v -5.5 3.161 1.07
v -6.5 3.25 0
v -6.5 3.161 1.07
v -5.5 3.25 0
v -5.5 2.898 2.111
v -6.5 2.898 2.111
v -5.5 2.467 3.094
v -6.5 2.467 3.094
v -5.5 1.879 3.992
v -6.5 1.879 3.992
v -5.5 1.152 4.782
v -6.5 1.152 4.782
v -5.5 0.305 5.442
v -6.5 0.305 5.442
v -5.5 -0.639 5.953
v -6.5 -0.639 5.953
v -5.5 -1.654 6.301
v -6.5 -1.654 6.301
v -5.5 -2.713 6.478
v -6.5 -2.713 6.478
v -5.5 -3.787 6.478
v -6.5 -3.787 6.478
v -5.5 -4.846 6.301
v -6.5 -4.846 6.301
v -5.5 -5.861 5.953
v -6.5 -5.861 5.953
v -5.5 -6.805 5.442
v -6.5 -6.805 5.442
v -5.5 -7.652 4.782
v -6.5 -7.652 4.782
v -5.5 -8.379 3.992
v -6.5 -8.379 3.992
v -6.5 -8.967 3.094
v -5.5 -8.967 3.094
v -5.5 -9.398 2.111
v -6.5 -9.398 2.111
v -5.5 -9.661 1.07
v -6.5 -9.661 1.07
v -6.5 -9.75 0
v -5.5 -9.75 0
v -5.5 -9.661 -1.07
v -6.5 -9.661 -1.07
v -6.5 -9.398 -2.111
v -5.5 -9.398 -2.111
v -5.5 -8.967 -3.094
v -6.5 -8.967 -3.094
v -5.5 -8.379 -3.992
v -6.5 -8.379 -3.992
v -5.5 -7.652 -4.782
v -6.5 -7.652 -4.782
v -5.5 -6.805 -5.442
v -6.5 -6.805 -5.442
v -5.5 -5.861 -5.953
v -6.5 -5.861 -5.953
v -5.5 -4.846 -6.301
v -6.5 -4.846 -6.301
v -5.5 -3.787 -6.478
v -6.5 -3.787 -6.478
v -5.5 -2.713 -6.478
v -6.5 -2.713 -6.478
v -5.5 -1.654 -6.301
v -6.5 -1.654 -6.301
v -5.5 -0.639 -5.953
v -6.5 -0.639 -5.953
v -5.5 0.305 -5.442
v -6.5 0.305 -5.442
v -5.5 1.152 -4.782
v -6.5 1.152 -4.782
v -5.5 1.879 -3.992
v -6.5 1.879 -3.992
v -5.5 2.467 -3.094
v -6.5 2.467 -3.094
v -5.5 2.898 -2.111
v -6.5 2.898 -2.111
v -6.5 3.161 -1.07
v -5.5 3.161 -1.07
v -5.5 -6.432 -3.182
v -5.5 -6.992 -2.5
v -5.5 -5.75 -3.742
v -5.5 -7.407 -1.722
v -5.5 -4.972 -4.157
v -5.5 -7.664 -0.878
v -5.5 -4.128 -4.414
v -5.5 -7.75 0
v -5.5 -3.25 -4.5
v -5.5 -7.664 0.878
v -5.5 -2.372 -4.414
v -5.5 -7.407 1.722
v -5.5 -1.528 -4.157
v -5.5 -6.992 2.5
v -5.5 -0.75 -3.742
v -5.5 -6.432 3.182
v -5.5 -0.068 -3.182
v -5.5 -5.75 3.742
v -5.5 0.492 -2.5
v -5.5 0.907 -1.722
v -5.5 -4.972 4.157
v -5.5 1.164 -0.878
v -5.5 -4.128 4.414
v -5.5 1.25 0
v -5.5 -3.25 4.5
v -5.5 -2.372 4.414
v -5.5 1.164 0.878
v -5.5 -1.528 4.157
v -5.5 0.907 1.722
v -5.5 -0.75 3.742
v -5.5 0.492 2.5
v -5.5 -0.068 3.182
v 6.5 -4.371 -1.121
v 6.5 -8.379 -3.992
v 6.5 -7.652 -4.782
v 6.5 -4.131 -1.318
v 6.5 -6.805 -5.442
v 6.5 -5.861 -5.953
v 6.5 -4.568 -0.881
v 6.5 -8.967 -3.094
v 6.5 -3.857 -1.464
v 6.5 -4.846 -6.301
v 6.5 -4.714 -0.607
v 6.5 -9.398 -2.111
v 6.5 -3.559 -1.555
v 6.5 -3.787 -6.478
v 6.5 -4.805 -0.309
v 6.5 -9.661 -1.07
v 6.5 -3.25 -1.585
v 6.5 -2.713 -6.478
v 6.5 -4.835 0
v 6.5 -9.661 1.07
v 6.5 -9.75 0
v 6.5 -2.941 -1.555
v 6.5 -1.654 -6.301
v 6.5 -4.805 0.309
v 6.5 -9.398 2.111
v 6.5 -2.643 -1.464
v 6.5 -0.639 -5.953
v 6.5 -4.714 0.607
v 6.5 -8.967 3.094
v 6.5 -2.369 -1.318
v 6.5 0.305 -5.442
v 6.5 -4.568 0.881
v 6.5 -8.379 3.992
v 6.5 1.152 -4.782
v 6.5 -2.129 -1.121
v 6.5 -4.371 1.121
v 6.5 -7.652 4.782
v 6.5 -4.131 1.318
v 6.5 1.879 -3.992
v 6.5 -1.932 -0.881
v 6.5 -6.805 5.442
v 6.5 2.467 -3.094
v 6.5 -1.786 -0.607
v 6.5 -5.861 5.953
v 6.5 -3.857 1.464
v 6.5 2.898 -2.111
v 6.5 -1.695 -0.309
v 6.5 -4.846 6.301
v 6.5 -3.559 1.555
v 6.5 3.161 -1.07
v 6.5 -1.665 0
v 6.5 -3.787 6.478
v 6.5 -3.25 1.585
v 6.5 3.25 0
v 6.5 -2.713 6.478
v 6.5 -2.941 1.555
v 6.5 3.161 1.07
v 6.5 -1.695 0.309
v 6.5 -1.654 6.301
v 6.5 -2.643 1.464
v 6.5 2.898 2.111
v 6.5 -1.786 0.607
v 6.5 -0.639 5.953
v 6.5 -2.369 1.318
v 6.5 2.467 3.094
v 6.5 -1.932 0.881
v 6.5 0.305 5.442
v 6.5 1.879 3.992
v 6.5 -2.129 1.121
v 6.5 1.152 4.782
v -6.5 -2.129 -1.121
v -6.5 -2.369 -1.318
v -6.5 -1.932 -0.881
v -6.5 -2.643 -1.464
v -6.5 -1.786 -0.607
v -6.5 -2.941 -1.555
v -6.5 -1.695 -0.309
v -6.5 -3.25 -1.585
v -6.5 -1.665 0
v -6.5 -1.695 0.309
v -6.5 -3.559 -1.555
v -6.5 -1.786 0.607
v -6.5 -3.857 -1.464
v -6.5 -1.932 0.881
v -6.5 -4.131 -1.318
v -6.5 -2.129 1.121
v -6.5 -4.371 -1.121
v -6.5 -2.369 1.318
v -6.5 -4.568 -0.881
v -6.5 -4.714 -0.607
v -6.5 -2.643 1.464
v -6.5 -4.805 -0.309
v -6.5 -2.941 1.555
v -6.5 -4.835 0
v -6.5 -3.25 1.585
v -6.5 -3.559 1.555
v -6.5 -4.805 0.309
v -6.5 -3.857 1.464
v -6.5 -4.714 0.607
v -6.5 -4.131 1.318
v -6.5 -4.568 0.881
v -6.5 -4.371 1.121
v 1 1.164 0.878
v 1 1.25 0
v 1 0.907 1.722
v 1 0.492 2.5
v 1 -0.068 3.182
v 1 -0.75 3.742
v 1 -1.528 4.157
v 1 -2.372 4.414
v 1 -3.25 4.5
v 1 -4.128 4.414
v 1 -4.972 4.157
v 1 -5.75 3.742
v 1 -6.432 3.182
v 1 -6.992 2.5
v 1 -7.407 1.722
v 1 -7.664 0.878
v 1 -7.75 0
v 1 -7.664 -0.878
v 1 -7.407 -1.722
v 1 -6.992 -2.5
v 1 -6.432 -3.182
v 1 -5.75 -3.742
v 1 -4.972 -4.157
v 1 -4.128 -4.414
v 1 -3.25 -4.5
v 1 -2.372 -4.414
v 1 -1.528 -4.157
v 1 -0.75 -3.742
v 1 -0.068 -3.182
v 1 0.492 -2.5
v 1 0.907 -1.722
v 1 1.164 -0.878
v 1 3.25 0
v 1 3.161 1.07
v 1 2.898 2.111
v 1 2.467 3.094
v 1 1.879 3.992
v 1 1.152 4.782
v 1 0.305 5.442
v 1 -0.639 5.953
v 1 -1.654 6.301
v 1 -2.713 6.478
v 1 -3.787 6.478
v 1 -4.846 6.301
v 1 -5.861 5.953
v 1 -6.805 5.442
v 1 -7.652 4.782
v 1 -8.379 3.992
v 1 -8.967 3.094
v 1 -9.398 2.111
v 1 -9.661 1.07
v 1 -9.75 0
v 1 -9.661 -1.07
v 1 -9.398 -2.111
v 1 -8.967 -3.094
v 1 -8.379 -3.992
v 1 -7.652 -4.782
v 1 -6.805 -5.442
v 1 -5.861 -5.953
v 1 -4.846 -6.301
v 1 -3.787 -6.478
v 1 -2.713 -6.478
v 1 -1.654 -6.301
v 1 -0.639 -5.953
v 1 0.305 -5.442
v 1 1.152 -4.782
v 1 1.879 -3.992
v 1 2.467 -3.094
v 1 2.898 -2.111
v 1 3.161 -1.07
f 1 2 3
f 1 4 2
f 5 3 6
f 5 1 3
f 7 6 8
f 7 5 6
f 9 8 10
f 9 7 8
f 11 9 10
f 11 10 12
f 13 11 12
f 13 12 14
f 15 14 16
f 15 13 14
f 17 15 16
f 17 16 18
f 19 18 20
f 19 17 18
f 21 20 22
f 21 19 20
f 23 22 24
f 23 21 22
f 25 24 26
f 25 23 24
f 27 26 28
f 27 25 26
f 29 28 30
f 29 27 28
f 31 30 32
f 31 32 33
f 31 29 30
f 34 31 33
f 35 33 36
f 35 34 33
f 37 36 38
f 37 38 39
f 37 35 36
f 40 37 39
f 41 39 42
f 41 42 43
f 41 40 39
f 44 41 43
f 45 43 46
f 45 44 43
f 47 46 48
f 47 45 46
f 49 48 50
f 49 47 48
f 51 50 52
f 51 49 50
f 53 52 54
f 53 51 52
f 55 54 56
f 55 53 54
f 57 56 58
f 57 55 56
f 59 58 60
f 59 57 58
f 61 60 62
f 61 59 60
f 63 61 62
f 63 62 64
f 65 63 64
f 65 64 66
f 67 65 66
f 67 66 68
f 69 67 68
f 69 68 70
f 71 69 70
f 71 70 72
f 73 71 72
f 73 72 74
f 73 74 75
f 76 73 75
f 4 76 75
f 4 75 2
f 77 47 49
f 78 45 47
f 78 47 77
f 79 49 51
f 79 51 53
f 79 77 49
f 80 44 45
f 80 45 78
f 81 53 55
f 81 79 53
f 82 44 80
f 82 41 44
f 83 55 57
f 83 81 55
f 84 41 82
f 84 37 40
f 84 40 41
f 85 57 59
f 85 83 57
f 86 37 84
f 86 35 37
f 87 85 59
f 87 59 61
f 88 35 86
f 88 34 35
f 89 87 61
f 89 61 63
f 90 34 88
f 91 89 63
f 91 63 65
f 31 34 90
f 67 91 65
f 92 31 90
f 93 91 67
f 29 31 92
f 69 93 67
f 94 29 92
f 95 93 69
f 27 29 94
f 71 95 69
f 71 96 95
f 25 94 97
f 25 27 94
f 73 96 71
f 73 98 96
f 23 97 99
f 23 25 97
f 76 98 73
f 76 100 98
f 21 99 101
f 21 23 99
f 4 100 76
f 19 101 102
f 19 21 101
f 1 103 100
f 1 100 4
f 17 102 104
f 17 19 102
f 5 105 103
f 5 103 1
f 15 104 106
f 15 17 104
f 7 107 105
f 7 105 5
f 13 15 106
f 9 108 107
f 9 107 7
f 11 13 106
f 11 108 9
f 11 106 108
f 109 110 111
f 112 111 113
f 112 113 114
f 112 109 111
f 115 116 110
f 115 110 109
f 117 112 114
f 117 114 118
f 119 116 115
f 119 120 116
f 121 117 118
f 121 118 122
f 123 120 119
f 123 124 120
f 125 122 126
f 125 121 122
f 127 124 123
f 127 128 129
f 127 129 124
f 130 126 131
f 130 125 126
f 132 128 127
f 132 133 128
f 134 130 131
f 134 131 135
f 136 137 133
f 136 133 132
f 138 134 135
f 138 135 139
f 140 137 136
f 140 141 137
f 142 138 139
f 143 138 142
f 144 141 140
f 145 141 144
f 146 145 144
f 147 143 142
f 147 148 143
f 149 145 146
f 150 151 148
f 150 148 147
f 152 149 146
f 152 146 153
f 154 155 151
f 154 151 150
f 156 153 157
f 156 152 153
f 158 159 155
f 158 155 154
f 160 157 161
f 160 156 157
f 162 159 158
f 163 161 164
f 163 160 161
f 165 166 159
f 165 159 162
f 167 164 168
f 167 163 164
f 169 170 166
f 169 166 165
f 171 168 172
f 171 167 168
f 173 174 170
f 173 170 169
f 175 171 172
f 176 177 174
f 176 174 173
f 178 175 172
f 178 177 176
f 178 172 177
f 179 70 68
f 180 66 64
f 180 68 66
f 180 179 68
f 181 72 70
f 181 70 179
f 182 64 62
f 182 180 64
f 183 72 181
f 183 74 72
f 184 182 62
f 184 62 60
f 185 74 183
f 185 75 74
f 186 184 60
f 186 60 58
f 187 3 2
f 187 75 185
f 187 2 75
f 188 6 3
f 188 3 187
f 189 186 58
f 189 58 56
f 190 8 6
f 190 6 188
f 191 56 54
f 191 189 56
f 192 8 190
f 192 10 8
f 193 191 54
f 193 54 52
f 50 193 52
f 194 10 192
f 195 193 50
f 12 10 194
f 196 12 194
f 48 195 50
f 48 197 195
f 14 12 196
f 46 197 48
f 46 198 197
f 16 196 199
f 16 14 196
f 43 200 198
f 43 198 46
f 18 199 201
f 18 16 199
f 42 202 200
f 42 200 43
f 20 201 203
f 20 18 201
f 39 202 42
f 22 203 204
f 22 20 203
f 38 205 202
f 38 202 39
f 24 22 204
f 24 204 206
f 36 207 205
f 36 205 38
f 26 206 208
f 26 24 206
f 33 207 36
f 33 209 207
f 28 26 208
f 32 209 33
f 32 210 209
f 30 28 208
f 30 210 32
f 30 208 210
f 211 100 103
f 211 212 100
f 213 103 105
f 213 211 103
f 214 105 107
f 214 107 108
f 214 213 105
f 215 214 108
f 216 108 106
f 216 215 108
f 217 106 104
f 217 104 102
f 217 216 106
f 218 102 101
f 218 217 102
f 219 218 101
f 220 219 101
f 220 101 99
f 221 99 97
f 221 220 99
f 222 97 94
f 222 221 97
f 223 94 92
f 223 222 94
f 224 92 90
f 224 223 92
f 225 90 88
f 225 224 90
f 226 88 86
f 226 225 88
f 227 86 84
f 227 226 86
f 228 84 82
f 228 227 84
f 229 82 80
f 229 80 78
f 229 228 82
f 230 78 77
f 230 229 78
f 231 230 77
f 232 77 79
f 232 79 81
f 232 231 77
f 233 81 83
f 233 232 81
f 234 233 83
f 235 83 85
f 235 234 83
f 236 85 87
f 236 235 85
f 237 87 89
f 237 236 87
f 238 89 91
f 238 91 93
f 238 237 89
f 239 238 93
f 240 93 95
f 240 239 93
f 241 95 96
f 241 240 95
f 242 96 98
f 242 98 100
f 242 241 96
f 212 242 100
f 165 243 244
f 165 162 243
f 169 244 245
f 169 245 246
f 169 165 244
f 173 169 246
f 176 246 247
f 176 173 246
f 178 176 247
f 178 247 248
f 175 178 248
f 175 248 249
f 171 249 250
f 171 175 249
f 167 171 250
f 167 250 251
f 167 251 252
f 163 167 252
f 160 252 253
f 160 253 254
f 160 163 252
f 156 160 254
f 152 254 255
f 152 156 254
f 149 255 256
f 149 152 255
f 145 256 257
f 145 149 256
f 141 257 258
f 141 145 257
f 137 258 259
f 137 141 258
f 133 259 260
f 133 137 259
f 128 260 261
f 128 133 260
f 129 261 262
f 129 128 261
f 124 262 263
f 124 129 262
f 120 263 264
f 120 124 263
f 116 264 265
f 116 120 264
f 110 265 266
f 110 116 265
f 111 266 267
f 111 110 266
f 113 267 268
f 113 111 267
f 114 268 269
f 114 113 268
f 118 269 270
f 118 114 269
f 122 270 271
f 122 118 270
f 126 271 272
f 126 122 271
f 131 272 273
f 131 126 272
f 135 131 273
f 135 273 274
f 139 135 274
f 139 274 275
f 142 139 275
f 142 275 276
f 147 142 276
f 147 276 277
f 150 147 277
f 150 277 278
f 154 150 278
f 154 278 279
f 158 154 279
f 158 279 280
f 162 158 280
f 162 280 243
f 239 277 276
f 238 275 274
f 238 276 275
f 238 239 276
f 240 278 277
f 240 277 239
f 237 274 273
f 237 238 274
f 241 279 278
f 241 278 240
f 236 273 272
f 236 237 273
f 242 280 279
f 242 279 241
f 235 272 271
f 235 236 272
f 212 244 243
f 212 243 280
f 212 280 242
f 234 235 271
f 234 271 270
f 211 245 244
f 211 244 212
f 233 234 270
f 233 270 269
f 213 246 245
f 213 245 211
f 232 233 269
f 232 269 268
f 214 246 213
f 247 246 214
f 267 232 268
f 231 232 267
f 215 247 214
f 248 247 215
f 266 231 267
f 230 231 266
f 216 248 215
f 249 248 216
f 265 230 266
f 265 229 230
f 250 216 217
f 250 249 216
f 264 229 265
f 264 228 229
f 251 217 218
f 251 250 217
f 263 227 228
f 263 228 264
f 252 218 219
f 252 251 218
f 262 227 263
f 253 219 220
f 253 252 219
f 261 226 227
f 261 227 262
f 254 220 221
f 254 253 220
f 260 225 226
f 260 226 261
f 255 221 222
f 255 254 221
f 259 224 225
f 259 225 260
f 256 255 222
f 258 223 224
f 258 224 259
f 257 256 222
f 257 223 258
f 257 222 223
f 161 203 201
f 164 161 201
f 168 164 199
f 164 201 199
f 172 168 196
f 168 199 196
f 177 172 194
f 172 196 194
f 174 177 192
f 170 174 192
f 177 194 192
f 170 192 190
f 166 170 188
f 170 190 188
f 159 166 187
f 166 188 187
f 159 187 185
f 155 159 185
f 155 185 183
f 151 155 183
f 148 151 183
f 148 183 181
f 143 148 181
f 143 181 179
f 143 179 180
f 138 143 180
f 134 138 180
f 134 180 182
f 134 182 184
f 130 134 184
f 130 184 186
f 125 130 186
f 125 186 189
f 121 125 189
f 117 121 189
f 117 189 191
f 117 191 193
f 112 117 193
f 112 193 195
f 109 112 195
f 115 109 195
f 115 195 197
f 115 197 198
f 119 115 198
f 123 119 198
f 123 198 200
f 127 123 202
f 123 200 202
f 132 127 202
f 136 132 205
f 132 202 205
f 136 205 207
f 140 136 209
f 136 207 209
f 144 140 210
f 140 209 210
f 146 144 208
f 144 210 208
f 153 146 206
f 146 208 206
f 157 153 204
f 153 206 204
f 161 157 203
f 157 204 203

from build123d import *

# Parameters (mm, degrees)
SKETCH_2_R          = 1.585
CUT_EXTRUDE_1_DEPTH = 14


with BuildPart() as part:
    # 草图1 → 旋转1 (revolve)
    with BuildSketch(Plane.XY):
        Polygon((6.5, -3.25), (-6.5, -3.25), (-6.5, 3.25), (-5.5, 3.25), (-5.5, 1.25), (1, 1.25), (1, 3.25), (6.5, 3.25), align=None)
    revolve(axis=Axis((-6.5, -3.25, 0), (1, 0, 0)))

    # 草图2 → 切除-拉伸1 (cut, through all)
    with BuildSketch(Plane.ZY.offset(6.5)):
        with Locations((0, -3.25)):
            Circle(SKETCH_2_R)
    extrude(amount=-CUT_EXTRUDE_1_DEPTH, mode=Mode.SUBTRACT)


solid = part.part
